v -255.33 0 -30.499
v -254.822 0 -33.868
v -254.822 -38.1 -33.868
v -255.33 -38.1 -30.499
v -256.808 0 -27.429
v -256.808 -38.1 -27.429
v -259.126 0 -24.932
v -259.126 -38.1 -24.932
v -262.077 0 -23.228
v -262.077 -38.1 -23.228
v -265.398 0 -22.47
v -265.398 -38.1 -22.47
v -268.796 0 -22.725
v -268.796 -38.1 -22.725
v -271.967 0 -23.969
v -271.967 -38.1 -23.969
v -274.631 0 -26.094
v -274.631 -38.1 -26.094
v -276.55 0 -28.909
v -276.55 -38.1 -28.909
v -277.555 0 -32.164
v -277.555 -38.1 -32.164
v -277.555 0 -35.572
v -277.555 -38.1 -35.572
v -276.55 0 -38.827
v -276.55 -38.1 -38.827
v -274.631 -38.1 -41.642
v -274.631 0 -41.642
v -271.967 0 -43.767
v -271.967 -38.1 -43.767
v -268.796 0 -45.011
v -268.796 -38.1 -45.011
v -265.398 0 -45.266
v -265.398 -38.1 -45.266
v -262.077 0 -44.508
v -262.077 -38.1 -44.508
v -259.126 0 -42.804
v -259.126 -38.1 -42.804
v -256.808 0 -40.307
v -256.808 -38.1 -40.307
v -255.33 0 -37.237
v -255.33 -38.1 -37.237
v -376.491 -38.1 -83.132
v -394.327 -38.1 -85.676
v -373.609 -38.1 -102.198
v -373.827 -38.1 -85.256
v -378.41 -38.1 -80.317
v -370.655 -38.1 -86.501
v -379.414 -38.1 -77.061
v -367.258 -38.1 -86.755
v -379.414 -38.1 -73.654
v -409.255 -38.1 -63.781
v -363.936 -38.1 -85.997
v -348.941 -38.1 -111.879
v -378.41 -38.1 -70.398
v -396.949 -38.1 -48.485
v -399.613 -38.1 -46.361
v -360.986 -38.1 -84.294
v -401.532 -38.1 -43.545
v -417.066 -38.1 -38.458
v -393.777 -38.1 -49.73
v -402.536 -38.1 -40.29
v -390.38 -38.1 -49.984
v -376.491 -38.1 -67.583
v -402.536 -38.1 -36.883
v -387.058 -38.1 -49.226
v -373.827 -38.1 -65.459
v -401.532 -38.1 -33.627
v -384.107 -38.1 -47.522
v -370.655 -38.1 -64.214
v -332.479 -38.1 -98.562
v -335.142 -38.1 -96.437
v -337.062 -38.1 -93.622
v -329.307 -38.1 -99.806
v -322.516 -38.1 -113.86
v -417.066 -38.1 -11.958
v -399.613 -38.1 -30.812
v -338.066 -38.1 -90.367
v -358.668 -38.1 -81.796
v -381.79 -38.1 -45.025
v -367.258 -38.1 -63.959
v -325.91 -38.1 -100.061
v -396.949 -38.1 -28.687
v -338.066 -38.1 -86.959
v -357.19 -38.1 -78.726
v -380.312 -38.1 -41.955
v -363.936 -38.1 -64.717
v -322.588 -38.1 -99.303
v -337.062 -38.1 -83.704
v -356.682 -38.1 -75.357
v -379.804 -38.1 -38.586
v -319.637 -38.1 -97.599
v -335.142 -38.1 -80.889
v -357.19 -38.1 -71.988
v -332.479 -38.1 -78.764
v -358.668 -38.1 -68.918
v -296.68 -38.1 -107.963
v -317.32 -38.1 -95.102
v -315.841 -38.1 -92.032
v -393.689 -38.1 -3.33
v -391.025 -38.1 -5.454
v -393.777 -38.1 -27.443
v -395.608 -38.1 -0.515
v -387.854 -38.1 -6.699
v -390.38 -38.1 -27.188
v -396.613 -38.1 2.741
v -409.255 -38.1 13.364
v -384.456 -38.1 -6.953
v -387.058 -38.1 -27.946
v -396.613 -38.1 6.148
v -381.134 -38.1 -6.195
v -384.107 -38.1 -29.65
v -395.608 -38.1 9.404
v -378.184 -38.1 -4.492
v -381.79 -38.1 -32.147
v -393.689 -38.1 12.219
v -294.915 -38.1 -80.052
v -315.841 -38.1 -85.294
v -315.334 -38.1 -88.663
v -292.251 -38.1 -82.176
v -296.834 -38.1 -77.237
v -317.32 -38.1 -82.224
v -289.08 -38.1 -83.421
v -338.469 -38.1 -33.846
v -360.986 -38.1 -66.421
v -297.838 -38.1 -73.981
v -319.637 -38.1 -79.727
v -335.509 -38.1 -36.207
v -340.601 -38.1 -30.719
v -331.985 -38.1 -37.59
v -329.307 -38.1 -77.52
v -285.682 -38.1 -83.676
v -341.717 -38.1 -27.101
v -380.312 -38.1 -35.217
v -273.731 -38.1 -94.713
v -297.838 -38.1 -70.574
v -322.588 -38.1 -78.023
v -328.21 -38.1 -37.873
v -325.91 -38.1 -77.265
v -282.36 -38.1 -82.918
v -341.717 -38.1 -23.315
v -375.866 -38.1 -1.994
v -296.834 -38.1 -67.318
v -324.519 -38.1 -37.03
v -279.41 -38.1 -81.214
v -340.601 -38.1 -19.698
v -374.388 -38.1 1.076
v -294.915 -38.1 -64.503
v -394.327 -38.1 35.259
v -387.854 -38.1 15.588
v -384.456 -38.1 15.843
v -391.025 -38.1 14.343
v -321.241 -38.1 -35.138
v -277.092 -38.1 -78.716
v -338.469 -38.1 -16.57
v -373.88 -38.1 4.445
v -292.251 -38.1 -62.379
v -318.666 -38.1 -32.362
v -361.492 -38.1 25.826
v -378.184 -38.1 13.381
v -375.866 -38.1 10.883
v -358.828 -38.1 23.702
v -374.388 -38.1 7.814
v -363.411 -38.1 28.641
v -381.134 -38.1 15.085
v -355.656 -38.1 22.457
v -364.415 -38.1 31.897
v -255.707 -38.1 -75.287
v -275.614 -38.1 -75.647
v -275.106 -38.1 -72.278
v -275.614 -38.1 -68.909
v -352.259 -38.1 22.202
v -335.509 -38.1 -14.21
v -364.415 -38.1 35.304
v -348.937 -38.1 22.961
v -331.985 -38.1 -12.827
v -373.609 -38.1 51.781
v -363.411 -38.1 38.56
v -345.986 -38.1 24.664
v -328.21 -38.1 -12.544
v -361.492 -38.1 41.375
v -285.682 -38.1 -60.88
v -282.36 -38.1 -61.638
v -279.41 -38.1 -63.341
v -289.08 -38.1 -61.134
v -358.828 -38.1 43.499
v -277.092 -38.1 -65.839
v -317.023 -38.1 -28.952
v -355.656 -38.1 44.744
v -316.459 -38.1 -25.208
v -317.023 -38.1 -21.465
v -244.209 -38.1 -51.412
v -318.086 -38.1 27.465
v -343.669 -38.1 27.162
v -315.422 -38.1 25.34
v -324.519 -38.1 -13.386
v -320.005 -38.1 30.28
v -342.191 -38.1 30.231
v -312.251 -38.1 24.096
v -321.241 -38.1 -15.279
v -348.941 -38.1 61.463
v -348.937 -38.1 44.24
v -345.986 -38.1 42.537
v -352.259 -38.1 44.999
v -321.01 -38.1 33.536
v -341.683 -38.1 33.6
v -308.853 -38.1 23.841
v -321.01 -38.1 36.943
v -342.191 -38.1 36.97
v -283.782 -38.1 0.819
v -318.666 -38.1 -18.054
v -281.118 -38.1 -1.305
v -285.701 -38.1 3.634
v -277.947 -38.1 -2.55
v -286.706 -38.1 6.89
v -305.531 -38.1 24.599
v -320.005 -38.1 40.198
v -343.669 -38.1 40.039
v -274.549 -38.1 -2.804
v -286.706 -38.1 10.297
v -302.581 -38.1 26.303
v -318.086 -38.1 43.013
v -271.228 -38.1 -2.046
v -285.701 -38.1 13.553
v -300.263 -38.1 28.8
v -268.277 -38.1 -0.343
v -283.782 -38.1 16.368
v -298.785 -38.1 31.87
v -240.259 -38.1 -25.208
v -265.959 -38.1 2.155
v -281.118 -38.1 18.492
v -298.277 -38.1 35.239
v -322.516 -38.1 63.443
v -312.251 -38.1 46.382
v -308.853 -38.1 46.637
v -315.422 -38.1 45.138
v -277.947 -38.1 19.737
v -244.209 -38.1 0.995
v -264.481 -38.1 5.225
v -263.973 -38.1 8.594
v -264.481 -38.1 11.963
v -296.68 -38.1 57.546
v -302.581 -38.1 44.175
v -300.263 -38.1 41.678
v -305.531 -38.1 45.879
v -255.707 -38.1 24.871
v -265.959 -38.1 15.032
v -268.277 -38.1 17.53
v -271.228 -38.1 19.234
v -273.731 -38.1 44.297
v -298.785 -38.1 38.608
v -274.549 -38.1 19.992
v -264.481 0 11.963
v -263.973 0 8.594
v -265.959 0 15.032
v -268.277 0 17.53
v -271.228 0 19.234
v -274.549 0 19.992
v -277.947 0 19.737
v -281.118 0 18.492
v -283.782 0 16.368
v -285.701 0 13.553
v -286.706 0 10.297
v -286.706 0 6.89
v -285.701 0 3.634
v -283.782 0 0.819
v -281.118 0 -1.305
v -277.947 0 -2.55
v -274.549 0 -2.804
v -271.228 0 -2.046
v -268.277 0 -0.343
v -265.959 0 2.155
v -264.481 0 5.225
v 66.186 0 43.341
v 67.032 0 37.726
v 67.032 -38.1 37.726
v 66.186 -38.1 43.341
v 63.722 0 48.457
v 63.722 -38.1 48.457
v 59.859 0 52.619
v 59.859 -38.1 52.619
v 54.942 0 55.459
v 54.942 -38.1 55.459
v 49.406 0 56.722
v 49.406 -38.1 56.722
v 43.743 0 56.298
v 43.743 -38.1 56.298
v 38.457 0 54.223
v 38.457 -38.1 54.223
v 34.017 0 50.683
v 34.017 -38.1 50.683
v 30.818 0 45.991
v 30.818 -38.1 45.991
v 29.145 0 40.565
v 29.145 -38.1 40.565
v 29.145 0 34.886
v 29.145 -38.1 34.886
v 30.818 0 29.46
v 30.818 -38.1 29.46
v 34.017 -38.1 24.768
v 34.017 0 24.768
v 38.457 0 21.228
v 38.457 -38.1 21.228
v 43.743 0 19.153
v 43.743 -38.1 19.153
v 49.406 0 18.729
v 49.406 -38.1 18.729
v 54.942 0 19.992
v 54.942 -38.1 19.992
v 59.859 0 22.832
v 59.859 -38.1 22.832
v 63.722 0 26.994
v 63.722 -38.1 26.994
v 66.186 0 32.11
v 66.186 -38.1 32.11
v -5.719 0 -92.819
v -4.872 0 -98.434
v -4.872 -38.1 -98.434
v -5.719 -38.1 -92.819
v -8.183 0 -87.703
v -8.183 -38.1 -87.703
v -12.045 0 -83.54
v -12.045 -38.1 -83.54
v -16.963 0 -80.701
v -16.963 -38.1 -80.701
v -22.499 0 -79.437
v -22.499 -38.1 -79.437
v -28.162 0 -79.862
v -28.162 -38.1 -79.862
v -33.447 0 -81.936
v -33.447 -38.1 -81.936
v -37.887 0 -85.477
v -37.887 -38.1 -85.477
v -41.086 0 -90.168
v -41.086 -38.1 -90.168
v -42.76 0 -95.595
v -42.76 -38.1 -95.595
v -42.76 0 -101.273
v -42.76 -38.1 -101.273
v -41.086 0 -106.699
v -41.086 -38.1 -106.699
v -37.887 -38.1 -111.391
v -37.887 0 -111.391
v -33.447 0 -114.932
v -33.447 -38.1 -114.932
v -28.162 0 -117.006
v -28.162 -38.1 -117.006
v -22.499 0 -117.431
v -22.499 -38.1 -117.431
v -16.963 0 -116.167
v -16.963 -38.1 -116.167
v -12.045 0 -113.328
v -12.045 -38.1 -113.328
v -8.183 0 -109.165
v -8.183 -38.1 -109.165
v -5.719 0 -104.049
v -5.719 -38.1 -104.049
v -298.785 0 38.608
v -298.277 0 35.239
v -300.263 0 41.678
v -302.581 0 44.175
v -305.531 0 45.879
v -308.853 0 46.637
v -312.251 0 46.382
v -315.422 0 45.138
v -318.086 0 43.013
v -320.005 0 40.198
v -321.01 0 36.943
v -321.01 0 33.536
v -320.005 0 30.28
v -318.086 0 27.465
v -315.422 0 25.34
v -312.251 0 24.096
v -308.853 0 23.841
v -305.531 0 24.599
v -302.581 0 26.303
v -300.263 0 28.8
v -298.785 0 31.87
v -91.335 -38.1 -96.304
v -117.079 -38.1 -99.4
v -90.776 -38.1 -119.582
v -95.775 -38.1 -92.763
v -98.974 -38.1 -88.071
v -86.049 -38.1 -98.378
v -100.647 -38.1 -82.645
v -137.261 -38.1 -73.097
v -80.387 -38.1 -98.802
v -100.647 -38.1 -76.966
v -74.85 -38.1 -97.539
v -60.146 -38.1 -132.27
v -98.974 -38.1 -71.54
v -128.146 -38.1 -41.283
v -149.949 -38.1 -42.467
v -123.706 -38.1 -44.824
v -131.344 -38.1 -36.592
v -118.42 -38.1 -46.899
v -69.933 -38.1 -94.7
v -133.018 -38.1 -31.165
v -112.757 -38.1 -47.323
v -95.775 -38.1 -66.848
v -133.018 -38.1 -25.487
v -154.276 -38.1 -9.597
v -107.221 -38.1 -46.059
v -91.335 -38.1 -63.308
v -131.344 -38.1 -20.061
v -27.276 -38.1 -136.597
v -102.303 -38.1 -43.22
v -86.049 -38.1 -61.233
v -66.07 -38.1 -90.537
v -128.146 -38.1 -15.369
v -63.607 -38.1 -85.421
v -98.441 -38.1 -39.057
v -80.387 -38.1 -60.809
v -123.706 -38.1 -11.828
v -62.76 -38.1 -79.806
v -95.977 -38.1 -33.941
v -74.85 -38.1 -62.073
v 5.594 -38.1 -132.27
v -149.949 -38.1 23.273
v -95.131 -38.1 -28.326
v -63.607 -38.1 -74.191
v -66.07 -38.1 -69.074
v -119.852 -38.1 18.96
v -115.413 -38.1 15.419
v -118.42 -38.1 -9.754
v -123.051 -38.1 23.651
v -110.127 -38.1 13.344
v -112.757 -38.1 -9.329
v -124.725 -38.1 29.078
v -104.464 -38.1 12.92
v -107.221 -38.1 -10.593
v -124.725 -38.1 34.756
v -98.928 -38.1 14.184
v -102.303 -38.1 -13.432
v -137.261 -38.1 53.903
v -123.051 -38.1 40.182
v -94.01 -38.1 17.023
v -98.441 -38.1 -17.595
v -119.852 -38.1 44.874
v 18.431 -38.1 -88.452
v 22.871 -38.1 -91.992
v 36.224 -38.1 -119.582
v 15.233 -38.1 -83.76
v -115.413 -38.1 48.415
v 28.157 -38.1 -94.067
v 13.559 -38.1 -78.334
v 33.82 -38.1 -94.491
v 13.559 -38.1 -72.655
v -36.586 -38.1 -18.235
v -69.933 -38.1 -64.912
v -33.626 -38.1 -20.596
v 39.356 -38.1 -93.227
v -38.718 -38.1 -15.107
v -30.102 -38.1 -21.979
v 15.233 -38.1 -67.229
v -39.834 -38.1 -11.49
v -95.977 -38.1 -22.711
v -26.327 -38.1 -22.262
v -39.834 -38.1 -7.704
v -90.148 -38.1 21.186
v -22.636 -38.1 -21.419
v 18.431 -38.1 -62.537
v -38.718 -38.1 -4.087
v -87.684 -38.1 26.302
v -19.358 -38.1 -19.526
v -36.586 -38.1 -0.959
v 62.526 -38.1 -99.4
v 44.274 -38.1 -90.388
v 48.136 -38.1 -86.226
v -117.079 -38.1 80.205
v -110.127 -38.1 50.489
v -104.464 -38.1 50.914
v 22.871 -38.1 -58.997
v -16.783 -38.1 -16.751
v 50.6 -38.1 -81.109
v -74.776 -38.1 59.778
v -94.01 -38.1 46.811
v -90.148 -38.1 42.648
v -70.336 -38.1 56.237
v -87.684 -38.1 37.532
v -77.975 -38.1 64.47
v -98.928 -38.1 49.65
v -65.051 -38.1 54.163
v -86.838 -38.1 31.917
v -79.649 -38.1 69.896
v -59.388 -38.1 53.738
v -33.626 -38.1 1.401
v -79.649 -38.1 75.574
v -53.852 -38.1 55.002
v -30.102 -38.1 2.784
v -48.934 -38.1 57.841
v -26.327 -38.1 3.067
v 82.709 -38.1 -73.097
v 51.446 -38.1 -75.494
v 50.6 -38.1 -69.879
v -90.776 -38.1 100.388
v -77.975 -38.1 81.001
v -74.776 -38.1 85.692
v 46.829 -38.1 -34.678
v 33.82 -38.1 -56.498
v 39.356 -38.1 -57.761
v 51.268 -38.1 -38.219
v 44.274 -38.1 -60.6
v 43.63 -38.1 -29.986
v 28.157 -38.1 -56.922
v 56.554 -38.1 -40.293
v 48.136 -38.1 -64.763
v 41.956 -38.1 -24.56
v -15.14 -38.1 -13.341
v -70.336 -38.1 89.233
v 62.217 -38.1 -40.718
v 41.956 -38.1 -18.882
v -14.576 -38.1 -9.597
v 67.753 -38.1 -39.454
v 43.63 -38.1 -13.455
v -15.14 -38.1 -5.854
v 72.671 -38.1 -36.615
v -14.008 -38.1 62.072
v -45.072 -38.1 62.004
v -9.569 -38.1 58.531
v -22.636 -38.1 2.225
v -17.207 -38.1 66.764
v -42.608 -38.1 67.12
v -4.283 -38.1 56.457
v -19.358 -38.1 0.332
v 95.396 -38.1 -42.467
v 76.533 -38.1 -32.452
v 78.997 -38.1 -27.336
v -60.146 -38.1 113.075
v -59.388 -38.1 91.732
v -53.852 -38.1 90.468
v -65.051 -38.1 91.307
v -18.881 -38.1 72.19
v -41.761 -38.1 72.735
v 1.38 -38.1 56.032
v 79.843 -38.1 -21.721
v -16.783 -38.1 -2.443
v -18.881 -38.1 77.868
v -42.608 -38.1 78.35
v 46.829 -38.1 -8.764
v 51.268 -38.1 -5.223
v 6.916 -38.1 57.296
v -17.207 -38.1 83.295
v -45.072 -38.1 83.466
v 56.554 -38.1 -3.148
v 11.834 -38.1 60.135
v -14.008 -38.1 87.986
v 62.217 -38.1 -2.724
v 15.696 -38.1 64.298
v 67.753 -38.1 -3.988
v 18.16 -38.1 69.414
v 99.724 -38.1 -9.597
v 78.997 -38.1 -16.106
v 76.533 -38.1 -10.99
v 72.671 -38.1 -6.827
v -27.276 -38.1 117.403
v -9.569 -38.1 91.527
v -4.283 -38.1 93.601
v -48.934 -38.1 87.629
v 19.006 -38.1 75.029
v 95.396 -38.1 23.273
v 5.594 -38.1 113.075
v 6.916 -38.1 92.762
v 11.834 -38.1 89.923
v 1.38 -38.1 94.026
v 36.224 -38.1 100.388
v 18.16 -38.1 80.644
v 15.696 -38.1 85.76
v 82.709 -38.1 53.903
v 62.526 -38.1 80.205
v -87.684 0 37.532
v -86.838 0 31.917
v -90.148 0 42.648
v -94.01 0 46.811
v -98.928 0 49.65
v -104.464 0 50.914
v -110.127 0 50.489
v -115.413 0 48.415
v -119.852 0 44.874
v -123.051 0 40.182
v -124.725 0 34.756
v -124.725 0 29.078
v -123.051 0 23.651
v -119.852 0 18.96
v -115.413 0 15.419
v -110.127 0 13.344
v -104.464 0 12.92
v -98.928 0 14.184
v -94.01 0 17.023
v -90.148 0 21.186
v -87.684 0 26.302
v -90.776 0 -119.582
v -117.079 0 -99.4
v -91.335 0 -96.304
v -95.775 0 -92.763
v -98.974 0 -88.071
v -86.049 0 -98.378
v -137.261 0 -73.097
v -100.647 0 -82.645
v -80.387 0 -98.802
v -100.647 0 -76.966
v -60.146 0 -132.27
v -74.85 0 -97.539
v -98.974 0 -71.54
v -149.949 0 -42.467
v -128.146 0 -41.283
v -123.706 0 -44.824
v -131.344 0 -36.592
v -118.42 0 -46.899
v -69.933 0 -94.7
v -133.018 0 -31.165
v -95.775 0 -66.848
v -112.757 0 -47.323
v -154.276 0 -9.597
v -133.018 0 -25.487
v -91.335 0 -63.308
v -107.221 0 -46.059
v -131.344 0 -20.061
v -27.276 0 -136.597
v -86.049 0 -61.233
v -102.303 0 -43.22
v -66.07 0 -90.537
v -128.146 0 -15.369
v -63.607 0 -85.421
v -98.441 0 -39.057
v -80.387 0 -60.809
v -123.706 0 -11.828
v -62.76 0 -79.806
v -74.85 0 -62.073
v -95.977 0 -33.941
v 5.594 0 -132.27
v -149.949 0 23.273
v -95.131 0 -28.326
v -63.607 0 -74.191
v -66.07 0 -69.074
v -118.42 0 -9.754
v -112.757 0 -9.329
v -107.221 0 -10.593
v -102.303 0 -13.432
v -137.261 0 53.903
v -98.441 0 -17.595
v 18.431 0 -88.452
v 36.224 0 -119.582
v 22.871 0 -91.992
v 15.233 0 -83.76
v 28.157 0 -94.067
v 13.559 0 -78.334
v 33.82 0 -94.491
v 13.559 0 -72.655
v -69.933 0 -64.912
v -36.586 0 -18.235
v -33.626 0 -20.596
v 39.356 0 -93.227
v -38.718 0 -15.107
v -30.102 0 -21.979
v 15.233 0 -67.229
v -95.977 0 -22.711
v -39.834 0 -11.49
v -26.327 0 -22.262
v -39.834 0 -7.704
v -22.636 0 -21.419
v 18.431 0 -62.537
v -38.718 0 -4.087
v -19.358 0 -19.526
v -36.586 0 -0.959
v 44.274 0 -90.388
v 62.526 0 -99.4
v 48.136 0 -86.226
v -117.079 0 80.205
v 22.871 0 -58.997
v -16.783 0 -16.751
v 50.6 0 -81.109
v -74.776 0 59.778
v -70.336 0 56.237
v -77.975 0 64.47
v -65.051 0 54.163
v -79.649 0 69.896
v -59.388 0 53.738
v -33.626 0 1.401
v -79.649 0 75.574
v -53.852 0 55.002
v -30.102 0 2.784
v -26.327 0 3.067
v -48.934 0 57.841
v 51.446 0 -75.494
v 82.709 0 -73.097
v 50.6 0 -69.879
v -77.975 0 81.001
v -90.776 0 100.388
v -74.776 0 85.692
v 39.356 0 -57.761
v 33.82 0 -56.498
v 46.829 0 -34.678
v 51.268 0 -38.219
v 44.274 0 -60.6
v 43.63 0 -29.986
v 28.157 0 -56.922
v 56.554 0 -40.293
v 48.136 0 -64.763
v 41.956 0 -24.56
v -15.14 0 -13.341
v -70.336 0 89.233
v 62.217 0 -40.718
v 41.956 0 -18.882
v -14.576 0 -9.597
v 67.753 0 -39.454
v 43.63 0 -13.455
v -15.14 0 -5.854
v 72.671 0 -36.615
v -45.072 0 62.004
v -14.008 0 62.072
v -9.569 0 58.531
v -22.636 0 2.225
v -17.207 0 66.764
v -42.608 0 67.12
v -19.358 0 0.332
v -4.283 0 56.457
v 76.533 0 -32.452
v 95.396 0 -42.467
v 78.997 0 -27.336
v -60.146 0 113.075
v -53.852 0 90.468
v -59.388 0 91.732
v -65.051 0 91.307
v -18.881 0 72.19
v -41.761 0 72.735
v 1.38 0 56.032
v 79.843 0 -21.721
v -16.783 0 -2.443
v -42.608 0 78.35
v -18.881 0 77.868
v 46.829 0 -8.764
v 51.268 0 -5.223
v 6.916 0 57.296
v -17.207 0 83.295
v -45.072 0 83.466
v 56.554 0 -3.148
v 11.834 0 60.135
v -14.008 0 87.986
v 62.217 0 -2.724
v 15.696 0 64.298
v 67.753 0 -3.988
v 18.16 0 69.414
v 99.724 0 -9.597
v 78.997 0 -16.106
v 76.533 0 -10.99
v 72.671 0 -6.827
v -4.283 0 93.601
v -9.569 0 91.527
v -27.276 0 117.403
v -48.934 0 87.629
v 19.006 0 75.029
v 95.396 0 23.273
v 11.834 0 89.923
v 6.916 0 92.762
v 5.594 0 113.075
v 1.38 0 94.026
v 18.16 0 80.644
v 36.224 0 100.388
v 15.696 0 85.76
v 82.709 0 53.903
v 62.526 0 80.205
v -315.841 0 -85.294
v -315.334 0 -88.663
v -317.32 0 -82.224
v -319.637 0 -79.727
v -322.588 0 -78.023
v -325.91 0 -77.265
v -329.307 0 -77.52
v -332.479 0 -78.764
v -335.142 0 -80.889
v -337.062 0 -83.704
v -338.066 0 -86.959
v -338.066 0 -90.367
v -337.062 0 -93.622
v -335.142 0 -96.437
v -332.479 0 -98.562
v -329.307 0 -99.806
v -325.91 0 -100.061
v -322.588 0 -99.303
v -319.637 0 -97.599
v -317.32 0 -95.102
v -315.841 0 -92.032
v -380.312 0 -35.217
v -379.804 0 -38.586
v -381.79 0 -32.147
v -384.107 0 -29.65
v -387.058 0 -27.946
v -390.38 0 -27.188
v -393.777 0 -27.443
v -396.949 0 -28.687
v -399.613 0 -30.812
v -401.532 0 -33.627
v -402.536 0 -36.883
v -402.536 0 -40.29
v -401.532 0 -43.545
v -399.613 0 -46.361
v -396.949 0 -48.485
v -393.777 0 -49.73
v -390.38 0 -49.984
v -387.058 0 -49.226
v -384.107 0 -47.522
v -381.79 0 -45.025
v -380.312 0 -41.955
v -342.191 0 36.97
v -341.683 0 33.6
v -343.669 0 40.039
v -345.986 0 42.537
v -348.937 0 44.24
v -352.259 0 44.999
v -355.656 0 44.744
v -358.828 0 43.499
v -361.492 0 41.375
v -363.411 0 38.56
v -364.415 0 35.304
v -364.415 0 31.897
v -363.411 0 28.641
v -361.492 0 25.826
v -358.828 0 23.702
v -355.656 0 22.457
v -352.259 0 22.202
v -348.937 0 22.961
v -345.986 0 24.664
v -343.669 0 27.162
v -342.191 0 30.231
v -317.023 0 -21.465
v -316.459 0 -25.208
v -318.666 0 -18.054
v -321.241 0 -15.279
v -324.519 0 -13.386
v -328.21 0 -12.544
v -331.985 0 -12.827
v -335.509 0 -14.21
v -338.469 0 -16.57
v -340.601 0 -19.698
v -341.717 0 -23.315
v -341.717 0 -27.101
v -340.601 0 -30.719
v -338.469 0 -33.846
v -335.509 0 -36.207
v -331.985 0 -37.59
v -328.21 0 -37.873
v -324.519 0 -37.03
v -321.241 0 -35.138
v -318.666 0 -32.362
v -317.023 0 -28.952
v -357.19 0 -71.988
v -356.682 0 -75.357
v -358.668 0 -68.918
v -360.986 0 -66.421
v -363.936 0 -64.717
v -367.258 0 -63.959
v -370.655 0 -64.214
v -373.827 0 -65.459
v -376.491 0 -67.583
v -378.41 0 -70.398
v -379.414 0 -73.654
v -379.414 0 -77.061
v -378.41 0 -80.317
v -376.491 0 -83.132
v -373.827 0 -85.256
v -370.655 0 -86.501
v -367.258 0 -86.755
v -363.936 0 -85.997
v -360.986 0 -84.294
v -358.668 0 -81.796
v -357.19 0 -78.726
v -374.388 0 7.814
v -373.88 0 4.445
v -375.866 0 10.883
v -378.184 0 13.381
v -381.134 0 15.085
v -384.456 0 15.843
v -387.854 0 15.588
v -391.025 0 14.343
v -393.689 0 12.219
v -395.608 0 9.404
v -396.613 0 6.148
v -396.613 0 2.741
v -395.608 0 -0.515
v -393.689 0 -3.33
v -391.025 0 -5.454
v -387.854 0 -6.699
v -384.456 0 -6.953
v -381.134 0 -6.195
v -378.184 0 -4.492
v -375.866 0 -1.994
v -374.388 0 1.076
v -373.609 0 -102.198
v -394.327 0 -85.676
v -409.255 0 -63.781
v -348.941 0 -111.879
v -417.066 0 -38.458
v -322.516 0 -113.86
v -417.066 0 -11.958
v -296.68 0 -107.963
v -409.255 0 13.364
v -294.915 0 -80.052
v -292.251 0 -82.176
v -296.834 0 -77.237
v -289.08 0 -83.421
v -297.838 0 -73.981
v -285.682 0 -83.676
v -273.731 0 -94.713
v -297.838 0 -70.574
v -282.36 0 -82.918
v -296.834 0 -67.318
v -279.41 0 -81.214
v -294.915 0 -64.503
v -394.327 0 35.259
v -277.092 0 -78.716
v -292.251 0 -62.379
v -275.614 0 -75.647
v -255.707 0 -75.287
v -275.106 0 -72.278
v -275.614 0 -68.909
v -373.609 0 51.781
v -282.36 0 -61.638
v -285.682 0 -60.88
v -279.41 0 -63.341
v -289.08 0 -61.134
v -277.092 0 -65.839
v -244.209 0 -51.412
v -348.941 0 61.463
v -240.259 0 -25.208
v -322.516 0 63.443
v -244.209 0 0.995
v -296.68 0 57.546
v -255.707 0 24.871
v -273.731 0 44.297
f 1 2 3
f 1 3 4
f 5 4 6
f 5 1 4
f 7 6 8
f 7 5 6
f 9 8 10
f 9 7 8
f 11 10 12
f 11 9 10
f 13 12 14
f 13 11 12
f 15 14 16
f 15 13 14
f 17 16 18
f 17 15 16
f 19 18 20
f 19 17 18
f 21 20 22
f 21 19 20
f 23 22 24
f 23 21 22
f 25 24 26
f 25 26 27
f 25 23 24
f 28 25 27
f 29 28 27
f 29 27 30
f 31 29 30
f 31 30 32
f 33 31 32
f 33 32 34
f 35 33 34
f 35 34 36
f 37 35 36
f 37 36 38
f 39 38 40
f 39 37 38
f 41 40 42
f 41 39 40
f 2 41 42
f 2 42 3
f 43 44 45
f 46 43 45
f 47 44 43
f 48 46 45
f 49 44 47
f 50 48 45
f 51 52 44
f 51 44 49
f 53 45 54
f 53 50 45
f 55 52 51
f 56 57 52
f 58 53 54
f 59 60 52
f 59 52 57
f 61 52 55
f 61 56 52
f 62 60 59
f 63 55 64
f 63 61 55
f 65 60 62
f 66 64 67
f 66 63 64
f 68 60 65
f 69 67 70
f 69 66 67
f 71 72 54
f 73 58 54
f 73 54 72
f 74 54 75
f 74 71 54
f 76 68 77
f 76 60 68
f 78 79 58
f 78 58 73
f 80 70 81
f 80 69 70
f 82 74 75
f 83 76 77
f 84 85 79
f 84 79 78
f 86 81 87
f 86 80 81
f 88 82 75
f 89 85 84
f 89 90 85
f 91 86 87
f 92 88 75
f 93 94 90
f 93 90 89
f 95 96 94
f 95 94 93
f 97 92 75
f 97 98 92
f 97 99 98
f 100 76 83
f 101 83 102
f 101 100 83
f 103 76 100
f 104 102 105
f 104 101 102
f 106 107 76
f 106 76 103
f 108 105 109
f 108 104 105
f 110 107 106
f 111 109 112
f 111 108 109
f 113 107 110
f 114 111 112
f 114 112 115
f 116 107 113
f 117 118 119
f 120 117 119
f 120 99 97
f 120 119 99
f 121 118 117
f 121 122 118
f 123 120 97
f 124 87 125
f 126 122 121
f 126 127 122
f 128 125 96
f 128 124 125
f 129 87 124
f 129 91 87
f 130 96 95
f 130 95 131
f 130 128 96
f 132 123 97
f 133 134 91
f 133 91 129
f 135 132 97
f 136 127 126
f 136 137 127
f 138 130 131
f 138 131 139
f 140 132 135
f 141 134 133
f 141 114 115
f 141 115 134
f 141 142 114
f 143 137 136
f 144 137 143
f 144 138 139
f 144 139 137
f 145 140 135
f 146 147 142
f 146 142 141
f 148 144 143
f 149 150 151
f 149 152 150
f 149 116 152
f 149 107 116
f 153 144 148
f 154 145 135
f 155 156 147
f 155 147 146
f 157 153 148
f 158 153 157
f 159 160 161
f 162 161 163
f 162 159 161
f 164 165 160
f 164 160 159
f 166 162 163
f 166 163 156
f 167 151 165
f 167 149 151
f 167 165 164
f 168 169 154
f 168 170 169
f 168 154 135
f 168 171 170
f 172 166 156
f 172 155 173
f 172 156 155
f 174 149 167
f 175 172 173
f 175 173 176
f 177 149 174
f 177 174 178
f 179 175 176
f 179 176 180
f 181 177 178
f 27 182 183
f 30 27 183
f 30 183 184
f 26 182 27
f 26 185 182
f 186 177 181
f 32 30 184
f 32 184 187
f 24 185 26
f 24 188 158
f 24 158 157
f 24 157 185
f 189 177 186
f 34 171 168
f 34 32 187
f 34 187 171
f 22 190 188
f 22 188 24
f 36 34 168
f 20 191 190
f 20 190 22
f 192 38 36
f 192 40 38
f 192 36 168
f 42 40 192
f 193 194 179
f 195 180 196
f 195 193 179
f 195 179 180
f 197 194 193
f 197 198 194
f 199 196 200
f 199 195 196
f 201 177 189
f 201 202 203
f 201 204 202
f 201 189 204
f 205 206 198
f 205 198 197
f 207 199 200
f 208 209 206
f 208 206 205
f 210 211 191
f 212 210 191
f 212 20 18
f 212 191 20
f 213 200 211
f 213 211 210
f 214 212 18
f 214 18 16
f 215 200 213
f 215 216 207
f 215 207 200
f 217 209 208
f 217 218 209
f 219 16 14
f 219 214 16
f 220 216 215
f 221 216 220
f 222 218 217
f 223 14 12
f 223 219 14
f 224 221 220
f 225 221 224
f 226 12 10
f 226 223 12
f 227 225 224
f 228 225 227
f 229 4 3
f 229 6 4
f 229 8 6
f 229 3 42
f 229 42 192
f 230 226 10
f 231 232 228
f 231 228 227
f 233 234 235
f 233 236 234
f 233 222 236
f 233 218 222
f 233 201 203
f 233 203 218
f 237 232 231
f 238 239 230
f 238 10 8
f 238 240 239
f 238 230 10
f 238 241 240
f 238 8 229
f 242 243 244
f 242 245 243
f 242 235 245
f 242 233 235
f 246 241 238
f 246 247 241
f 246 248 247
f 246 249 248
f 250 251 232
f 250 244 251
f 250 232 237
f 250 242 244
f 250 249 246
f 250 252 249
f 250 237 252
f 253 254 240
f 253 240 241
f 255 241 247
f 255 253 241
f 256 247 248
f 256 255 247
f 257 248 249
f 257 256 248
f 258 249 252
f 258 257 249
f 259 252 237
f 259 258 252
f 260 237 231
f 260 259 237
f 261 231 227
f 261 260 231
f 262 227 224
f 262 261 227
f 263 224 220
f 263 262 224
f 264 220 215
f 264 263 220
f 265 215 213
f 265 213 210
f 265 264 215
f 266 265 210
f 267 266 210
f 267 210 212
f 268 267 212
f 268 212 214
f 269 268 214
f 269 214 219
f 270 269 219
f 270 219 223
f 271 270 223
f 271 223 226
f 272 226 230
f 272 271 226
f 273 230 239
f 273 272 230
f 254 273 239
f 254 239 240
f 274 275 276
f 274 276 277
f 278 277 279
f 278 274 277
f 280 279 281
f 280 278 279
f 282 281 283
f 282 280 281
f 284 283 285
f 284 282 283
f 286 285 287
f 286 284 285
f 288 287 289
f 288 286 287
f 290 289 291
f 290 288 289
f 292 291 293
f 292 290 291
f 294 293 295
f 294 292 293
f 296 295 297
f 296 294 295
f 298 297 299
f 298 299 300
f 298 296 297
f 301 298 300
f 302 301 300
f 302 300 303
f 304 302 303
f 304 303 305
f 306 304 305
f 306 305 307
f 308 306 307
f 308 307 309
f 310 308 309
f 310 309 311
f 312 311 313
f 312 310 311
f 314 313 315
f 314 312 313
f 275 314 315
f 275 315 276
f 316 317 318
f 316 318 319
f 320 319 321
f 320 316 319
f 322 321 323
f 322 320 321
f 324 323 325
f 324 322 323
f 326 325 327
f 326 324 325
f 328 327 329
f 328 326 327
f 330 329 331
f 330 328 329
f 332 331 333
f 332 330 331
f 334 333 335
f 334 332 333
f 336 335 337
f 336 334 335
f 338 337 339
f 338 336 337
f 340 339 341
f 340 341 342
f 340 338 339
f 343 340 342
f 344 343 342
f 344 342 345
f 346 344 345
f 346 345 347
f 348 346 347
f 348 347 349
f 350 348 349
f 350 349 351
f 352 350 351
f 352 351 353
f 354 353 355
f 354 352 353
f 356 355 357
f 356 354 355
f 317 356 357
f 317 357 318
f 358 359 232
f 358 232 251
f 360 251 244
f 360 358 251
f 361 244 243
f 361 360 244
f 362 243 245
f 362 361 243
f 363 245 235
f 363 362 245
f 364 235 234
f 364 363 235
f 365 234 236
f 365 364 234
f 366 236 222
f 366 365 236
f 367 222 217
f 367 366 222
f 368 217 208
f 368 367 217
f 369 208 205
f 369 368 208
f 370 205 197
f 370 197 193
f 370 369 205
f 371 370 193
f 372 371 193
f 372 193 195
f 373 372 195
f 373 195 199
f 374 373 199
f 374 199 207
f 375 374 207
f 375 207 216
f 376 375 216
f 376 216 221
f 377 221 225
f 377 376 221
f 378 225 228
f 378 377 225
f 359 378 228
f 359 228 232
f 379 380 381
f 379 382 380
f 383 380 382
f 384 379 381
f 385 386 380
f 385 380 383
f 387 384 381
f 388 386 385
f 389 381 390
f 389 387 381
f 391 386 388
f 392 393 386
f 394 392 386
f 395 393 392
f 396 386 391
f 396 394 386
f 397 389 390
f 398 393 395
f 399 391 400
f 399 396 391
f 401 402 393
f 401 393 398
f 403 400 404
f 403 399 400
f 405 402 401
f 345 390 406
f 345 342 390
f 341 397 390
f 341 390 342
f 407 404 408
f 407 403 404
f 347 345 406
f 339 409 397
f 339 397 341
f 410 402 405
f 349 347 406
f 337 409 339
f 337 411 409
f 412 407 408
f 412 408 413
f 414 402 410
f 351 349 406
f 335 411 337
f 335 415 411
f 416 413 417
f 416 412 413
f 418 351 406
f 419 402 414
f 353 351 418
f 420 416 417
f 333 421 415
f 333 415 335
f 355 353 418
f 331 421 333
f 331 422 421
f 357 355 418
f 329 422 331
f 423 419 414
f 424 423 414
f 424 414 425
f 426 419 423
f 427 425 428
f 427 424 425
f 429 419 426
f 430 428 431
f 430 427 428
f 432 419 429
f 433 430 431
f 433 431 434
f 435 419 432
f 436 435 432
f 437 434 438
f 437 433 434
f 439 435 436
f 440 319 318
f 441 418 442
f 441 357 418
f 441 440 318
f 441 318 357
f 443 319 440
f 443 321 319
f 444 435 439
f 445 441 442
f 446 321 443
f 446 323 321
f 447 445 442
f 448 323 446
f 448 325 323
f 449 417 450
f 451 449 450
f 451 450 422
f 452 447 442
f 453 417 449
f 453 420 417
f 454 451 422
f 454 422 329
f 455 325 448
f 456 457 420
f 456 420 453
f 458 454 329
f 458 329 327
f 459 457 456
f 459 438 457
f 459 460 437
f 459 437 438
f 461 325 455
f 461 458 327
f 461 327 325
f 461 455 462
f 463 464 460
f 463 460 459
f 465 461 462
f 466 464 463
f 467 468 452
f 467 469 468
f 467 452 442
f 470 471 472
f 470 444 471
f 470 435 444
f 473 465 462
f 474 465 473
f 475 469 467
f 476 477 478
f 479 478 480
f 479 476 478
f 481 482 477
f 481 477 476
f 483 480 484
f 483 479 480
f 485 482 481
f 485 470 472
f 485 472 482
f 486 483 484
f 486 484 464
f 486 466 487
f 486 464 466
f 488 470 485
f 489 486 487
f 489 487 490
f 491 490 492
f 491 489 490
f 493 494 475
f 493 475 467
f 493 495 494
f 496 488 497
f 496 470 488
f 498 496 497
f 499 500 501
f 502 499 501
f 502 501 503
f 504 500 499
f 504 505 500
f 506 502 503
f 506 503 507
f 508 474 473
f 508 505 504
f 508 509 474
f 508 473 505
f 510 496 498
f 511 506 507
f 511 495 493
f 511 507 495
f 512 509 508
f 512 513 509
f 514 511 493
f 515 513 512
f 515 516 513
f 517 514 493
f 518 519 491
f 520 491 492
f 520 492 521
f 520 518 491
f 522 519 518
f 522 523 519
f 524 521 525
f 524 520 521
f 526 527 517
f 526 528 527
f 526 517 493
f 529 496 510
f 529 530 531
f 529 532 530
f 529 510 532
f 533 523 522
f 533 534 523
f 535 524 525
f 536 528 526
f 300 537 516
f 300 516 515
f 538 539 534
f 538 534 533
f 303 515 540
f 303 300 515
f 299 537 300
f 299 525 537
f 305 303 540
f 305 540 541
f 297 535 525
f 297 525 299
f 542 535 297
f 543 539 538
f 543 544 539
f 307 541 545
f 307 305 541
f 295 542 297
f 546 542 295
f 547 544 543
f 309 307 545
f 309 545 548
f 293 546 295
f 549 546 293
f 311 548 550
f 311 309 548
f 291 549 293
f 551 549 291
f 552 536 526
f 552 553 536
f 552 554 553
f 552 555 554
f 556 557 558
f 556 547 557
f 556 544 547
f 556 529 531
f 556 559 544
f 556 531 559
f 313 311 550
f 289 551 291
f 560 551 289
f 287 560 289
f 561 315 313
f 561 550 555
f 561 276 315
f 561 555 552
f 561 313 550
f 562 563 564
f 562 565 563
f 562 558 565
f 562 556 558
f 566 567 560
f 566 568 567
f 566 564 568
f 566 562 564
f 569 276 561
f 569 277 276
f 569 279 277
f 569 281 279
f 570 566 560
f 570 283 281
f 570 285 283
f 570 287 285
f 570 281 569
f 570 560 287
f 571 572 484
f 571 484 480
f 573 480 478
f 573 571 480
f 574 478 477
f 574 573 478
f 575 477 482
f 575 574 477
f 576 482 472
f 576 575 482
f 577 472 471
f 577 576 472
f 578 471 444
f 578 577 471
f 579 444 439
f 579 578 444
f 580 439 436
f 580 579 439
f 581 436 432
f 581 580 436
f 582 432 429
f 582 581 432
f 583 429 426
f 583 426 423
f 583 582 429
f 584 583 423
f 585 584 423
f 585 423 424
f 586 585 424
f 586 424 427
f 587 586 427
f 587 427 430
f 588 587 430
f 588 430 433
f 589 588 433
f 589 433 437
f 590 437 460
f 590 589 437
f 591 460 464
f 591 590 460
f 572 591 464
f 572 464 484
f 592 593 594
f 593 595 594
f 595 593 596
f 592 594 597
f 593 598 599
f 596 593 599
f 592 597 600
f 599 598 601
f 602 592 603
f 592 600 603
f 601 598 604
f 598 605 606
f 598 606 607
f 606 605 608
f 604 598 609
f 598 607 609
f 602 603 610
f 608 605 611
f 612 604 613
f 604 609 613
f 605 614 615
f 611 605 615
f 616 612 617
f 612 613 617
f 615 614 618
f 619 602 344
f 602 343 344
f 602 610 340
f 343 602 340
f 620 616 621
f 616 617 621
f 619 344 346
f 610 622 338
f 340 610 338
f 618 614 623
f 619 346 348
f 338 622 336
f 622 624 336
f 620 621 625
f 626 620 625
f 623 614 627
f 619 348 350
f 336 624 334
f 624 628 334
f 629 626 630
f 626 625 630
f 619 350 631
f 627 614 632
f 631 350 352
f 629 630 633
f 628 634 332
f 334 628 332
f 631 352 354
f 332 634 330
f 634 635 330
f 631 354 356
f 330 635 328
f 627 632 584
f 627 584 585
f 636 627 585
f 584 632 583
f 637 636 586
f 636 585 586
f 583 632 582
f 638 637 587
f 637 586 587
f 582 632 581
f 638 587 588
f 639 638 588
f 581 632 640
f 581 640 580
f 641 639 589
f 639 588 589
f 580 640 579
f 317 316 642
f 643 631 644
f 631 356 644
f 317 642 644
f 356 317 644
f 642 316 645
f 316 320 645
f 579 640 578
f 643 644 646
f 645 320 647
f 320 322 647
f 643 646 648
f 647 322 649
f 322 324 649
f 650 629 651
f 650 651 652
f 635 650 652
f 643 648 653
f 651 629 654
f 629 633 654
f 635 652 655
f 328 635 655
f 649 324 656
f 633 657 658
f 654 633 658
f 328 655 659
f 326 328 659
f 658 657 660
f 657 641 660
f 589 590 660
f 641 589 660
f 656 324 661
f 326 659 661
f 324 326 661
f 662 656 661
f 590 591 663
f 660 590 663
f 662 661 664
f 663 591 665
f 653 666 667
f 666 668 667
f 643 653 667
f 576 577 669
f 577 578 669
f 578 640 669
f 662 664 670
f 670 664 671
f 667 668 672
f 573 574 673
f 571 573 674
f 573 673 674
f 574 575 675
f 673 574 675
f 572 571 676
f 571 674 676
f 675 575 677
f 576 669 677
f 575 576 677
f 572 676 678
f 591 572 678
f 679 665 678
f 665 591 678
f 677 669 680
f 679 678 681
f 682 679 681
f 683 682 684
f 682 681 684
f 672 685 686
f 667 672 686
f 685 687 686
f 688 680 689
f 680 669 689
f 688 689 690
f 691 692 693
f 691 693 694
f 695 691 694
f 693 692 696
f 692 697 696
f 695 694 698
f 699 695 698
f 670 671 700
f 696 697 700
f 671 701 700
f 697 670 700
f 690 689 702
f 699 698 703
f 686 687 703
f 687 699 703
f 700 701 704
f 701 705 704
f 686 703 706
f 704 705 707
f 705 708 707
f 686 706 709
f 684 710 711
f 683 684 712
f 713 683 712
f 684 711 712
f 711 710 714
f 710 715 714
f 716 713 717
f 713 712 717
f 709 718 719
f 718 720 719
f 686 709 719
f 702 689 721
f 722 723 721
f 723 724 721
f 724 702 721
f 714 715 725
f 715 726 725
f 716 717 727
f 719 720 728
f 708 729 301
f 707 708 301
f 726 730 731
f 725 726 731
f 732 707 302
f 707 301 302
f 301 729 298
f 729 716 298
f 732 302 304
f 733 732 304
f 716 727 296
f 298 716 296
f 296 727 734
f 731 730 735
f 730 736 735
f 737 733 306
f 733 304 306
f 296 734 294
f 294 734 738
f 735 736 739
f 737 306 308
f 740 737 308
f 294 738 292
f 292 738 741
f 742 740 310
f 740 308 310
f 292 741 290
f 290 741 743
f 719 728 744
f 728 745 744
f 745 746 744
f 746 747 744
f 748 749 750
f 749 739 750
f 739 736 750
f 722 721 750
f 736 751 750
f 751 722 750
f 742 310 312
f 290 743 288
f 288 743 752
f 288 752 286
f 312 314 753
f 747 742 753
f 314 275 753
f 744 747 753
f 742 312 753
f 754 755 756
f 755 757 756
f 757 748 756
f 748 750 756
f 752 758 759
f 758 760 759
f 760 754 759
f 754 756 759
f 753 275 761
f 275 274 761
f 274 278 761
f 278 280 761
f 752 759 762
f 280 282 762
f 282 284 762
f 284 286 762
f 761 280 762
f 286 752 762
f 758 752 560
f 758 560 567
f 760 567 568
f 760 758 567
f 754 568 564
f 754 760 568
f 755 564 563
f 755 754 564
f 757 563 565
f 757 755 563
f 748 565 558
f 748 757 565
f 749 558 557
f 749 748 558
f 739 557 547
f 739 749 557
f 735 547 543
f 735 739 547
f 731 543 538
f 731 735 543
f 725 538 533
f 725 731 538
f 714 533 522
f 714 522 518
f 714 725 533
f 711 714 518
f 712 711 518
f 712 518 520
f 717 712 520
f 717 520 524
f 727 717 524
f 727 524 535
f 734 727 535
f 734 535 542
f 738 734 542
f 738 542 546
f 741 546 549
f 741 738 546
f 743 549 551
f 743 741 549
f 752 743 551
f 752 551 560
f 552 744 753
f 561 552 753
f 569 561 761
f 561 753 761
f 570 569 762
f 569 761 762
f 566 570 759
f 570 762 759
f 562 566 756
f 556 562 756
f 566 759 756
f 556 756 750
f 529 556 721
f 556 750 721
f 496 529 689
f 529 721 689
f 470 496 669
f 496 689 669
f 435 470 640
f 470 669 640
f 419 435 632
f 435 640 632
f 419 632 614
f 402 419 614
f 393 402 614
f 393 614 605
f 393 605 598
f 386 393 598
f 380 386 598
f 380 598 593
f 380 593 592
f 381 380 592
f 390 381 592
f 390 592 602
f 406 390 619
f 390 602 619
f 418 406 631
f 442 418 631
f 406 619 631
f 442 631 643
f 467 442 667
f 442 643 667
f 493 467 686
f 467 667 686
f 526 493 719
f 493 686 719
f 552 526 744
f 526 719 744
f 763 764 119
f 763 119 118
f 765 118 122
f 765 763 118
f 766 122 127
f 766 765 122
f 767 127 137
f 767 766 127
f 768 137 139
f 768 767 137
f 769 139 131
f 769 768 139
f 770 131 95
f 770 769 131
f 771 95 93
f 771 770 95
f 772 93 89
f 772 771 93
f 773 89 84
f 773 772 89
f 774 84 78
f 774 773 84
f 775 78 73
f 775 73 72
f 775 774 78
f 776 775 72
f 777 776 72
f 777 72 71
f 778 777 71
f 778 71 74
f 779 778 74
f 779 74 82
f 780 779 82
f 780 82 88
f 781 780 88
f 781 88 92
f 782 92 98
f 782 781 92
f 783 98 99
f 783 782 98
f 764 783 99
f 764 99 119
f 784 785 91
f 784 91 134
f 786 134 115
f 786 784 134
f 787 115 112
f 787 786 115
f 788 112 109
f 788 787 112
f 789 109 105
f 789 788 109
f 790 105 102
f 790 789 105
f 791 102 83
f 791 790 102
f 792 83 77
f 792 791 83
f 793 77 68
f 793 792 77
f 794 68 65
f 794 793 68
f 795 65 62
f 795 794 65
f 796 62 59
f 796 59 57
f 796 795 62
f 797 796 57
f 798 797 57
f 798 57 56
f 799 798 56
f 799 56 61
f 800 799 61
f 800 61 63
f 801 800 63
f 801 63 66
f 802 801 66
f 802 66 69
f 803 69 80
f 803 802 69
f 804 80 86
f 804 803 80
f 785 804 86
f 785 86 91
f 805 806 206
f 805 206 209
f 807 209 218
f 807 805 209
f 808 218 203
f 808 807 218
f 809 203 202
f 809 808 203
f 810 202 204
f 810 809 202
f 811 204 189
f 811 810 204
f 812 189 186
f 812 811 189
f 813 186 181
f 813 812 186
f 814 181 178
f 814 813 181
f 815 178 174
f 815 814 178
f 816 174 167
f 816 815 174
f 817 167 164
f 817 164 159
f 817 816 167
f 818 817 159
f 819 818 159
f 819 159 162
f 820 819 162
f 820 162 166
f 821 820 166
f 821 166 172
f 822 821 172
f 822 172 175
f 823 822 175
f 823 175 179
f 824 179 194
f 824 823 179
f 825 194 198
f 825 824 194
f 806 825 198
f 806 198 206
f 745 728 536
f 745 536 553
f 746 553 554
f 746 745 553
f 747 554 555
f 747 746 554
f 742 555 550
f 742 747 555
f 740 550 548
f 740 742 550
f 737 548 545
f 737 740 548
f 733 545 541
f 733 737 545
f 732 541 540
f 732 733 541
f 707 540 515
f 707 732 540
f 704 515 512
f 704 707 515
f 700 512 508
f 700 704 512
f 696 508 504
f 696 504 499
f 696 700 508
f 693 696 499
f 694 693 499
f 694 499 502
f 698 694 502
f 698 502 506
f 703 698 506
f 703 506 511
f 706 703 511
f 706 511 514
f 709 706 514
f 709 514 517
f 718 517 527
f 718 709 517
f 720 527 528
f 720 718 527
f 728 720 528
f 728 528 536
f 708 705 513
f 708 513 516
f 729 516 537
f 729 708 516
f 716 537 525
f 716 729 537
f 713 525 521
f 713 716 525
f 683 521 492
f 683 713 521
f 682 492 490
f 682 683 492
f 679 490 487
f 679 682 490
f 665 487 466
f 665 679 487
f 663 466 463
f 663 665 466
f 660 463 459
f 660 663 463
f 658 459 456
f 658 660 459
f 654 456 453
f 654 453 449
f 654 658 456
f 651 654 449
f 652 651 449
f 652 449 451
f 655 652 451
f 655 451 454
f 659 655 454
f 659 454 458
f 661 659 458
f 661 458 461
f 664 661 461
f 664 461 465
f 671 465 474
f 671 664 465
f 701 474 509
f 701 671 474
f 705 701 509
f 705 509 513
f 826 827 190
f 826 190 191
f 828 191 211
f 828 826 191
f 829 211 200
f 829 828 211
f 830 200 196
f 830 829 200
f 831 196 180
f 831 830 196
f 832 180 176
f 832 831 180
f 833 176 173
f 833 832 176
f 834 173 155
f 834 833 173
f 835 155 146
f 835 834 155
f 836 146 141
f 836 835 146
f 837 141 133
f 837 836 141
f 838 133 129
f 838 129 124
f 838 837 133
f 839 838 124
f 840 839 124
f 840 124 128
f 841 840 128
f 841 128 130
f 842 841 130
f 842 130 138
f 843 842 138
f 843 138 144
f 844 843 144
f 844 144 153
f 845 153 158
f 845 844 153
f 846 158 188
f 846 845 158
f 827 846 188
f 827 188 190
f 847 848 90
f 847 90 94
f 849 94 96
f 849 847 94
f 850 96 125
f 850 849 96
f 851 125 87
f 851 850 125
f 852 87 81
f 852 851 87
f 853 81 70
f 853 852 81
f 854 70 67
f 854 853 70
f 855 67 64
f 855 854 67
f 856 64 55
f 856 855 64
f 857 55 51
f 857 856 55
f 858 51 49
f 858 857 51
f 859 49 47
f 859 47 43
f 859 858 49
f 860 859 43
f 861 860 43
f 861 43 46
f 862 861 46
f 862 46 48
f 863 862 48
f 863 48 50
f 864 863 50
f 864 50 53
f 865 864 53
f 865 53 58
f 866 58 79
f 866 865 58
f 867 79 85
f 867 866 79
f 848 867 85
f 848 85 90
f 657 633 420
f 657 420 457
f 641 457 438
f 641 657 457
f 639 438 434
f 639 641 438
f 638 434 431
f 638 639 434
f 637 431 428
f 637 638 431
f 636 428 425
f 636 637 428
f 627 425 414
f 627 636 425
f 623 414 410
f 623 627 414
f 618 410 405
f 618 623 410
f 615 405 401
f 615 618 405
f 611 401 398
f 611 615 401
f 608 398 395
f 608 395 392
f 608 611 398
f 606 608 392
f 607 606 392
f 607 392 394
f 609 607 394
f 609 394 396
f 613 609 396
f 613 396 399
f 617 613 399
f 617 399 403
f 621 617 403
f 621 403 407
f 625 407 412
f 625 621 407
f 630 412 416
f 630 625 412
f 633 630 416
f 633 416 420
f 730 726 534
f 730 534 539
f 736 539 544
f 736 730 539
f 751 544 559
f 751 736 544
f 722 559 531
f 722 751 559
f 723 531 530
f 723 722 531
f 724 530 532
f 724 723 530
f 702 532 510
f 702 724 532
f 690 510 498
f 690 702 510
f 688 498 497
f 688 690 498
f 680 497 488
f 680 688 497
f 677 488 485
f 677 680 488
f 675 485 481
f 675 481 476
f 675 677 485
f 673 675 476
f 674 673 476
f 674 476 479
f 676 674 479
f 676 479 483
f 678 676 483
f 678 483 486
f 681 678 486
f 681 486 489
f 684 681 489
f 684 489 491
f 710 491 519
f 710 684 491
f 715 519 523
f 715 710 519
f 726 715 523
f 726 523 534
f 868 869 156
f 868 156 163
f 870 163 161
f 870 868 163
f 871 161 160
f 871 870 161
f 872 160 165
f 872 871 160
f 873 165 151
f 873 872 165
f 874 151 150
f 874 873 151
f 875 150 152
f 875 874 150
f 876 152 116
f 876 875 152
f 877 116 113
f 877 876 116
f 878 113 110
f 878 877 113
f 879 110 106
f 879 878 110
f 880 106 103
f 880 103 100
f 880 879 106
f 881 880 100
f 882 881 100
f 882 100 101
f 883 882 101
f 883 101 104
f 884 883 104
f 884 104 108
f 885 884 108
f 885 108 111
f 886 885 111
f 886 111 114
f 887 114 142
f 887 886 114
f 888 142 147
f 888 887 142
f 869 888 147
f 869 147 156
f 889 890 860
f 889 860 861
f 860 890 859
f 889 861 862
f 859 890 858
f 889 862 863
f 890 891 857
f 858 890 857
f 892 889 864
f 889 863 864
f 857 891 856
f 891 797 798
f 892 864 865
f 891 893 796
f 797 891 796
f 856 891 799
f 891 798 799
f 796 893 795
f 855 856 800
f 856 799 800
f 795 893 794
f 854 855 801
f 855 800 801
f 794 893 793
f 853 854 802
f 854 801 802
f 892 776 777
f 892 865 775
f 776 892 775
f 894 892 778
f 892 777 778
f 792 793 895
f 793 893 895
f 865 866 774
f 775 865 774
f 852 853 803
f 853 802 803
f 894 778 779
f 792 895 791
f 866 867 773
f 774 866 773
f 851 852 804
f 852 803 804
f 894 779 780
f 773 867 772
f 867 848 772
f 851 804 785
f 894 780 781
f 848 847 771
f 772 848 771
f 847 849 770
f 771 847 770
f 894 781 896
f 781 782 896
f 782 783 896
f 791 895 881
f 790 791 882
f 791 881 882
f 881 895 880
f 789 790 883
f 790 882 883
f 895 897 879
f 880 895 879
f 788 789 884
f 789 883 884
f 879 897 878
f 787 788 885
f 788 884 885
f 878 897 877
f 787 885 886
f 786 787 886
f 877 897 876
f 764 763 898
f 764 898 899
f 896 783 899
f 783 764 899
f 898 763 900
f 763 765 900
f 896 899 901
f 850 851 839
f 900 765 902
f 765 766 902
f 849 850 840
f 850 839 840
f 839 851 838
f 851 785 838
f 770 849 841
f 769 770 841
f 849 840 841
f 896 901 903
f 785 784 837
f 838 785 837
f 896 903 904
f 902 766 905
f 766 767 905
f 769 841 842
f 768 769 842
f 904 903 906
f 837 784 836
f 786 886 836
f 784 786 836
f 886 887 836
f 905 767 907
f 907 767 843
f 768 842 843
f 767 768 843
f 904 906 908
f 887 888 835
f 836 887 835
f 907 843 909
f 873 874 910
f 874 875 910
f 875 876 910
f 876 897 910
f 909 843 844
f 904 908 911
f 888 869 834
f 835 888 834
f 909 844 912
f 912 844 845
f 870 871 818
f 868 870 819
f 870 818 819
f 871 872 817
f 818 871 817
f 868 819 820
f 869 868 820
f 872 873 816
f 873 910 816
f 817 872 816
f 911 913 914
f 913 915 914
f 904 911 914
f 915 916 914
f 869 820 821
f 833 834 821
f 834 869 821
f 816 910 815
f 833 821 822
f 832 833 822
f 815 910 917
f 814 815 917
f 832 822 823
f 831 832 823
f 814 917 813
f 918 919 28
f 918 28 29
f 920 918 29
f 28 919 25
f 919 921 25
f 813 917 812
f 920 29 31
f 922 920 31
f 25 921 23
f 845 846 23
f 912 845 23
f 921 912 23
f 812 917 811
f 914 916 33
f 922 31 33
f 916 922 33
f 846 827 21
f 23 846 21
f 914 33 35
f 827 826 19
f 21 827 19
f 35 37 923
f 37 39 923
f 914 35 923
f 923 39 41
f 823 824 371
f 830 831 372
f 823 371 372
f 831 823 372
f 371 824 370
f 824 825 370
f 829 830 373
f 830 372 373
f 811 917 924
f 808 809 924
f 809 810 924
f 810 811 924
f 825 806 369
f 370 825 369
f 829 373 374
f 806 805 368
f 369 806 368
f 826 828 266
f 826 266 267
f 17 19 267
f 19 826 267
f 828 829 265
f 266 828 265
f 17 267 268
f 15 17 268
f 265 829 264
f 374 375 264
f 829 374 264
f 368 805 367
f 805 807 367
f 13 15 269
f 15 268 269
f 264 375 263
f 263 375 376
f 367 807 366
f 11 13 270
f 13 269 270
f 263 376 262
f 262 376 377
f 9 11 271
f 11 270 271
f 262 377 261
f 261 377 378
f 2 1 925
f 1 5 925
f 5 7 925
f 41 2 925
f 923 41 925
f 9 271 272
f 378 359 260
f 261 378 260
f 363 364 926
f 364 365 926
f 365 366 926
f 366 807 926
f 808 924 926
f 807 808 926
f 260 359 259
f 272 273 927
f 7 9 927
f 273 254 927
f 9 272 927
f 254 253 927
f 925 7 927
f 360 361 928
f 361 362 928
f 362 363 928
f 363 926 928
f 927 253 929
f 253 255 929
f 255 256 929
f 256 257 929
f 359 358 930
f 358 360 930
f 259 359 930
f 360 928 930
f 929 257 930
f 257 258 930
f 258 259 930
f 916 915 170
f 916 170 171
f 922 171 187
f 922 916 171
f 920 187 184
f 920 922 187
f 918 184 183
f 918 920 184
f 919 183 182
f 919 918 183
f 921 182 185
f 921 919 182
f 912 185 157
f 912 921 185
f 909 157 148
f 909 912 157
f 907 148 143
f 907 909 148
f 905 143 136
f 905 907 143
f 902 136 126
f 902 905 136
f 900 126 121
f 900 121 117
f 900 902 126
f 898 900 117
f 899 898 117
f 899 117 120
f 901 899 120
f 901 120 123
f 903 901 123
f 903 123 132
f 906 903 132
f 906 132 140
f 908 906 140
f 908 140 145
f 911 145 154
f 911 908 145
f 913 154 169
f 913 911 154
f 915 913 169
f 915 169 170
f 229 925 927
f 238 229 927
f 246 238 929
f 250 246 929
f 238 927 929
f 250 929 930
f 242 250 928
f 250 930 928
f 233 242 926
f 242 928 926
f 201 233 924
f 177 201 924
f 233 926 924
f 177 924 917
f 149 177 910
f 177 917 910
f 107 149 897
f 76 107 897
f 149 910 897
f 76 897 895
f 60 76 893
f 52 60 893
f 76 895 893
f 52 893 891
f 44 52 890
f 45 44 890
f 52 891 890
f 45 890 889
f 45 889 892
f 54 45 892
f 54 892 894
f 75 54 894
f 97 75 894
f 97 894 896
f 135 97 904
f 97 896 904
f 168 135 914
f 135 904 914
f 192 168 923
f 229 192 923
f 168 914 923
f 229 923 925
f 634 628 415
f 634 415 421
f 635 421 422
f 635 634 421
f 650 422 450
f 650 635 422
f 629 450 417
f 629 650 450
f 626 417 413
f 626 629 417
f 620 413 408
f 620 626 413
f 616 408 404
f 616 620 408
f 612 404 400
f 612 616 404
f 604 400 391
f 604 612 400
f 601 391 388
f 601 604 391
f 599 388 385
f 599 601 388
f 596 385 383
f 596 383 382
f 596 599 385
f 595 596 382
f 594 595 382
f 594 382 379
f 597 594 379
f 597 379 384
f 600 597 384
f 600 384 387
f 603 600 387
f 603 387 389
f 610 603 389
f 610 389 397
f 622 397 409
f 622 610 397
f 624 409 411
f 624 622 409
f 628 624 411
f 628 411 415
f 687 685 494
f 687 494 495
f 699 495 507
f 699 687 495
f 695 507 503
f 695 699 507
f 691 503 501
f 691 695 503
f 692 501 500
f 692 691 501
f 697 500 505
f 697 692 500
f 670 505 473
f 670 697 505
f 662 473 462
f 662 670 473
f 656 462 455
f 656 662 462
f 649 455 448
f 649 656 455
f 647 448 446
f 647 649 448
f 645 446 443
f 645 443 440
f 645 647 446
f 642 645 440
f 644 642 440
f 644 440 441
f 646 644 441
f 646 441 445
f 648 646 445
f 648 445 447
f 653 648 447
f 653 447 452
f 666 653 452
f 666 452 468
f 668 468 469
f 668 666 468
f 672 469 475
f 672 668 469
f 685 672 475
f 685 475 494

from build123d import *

# Parameters (mm, degrees)
F0_R     = 127
F0_R_2   = 19.05
F0_R_3   = 12.7
F0_R_4   = 88.9
F0_R_5   = 11.43
F1_DEPTH = 38.1


with BuildPart() as f1:
    # F0 (on Front) → F1 (new body)
    with BuildSketch(Plane.XZ):
        with Locations((-27.276136, -9.597159)):
            Circle(F0_R)
        with Locations((-81.810238, -79.805717)):
            Circle(F0_R_2, mode=Mode.SUBTRACT)
        with Locations((-23.922491, -98.43388)):
            Circle(F0_R_2, mode=Mode.SUBTRACT)
        with Locations((32.396049, -75.494354)):
            Circle(F0_R_2, mode=Mode.SUBTRACT)
        with Locations((-114.180874, -28.32619)):
            Circle(F0_R_2, mode=Mode.SUBTRACT)
        with Locations((60.79331, -21.720798)):
            Circle(F0_R_2, mode=Mode.SUBTRACT)
        with Locations((-105.887816, 31.91686)):
            Circle(F0_R_2, mode=Mode.SUBTRACT)
        with Locations((-27.276136, -9.597159)):
            Circle(F0_R_3, mode=Mode.SUBTRACT)
        with Locations((47.981899, 37.725544)):
            Circle(F0_R_2, mode=Mode.SUBTRACT)
        with Locations((-60.81148, 72.735038)):
            Circle(F0_R_2, mode=Mode.SUBTRACT)
        with Locations((-0.043583, 75.029067)):
            Circle(F0_R_2, mode=Mode.SUBTRACT)
        with Locations((-329.159146, -25.208248)):
            Circle(F0_R_4)
        with Locations((-368.112076, -75.357219)):
            Circle(F0_R_5, mode=Mode.SUBTRACT)
        with Locations((-326.763685, -88.663049)):
            Circle(F0_R_5, mode=Mode.SUBTRACT)
        with Locations((-391.233958, -38.586127)):
            Circle(F0_R_5, mode=Mode.SUBTRACT)
        with Locations((-329.159146, -25.208248)):
            Circle(F0_R_3, mode=Mode.SUBTRACT)
        with Locations((-286.536156, -72.277673)):
            Circle(F0_R_5, mode=Mode.SUBTRACT)
        with Locations((-266.252398, -33.86799)):
            Circle(F0_R_5, mode=Mode.SUBTRACT)
        with Locations((-385.310346, 4.444622)):
            Circle(F0_R_5, mode=Mode.SUBTRACT)
        with Locations((-353.112963, 33.600464)):
            Circle(F0_R_5, mode=Mode.SUBTRACT)
        with Locations((-309.707322, 35.239056)):
            Circle(F0_R_5, mode=Mode.SUBTRACT)
        with Locations((-275.403406, 8.593682)):
            Circle(F0_R_5, mode=Mode.SUBTRACT)
    extrude(amount=F1_DEPTH)


solid = f1.part
